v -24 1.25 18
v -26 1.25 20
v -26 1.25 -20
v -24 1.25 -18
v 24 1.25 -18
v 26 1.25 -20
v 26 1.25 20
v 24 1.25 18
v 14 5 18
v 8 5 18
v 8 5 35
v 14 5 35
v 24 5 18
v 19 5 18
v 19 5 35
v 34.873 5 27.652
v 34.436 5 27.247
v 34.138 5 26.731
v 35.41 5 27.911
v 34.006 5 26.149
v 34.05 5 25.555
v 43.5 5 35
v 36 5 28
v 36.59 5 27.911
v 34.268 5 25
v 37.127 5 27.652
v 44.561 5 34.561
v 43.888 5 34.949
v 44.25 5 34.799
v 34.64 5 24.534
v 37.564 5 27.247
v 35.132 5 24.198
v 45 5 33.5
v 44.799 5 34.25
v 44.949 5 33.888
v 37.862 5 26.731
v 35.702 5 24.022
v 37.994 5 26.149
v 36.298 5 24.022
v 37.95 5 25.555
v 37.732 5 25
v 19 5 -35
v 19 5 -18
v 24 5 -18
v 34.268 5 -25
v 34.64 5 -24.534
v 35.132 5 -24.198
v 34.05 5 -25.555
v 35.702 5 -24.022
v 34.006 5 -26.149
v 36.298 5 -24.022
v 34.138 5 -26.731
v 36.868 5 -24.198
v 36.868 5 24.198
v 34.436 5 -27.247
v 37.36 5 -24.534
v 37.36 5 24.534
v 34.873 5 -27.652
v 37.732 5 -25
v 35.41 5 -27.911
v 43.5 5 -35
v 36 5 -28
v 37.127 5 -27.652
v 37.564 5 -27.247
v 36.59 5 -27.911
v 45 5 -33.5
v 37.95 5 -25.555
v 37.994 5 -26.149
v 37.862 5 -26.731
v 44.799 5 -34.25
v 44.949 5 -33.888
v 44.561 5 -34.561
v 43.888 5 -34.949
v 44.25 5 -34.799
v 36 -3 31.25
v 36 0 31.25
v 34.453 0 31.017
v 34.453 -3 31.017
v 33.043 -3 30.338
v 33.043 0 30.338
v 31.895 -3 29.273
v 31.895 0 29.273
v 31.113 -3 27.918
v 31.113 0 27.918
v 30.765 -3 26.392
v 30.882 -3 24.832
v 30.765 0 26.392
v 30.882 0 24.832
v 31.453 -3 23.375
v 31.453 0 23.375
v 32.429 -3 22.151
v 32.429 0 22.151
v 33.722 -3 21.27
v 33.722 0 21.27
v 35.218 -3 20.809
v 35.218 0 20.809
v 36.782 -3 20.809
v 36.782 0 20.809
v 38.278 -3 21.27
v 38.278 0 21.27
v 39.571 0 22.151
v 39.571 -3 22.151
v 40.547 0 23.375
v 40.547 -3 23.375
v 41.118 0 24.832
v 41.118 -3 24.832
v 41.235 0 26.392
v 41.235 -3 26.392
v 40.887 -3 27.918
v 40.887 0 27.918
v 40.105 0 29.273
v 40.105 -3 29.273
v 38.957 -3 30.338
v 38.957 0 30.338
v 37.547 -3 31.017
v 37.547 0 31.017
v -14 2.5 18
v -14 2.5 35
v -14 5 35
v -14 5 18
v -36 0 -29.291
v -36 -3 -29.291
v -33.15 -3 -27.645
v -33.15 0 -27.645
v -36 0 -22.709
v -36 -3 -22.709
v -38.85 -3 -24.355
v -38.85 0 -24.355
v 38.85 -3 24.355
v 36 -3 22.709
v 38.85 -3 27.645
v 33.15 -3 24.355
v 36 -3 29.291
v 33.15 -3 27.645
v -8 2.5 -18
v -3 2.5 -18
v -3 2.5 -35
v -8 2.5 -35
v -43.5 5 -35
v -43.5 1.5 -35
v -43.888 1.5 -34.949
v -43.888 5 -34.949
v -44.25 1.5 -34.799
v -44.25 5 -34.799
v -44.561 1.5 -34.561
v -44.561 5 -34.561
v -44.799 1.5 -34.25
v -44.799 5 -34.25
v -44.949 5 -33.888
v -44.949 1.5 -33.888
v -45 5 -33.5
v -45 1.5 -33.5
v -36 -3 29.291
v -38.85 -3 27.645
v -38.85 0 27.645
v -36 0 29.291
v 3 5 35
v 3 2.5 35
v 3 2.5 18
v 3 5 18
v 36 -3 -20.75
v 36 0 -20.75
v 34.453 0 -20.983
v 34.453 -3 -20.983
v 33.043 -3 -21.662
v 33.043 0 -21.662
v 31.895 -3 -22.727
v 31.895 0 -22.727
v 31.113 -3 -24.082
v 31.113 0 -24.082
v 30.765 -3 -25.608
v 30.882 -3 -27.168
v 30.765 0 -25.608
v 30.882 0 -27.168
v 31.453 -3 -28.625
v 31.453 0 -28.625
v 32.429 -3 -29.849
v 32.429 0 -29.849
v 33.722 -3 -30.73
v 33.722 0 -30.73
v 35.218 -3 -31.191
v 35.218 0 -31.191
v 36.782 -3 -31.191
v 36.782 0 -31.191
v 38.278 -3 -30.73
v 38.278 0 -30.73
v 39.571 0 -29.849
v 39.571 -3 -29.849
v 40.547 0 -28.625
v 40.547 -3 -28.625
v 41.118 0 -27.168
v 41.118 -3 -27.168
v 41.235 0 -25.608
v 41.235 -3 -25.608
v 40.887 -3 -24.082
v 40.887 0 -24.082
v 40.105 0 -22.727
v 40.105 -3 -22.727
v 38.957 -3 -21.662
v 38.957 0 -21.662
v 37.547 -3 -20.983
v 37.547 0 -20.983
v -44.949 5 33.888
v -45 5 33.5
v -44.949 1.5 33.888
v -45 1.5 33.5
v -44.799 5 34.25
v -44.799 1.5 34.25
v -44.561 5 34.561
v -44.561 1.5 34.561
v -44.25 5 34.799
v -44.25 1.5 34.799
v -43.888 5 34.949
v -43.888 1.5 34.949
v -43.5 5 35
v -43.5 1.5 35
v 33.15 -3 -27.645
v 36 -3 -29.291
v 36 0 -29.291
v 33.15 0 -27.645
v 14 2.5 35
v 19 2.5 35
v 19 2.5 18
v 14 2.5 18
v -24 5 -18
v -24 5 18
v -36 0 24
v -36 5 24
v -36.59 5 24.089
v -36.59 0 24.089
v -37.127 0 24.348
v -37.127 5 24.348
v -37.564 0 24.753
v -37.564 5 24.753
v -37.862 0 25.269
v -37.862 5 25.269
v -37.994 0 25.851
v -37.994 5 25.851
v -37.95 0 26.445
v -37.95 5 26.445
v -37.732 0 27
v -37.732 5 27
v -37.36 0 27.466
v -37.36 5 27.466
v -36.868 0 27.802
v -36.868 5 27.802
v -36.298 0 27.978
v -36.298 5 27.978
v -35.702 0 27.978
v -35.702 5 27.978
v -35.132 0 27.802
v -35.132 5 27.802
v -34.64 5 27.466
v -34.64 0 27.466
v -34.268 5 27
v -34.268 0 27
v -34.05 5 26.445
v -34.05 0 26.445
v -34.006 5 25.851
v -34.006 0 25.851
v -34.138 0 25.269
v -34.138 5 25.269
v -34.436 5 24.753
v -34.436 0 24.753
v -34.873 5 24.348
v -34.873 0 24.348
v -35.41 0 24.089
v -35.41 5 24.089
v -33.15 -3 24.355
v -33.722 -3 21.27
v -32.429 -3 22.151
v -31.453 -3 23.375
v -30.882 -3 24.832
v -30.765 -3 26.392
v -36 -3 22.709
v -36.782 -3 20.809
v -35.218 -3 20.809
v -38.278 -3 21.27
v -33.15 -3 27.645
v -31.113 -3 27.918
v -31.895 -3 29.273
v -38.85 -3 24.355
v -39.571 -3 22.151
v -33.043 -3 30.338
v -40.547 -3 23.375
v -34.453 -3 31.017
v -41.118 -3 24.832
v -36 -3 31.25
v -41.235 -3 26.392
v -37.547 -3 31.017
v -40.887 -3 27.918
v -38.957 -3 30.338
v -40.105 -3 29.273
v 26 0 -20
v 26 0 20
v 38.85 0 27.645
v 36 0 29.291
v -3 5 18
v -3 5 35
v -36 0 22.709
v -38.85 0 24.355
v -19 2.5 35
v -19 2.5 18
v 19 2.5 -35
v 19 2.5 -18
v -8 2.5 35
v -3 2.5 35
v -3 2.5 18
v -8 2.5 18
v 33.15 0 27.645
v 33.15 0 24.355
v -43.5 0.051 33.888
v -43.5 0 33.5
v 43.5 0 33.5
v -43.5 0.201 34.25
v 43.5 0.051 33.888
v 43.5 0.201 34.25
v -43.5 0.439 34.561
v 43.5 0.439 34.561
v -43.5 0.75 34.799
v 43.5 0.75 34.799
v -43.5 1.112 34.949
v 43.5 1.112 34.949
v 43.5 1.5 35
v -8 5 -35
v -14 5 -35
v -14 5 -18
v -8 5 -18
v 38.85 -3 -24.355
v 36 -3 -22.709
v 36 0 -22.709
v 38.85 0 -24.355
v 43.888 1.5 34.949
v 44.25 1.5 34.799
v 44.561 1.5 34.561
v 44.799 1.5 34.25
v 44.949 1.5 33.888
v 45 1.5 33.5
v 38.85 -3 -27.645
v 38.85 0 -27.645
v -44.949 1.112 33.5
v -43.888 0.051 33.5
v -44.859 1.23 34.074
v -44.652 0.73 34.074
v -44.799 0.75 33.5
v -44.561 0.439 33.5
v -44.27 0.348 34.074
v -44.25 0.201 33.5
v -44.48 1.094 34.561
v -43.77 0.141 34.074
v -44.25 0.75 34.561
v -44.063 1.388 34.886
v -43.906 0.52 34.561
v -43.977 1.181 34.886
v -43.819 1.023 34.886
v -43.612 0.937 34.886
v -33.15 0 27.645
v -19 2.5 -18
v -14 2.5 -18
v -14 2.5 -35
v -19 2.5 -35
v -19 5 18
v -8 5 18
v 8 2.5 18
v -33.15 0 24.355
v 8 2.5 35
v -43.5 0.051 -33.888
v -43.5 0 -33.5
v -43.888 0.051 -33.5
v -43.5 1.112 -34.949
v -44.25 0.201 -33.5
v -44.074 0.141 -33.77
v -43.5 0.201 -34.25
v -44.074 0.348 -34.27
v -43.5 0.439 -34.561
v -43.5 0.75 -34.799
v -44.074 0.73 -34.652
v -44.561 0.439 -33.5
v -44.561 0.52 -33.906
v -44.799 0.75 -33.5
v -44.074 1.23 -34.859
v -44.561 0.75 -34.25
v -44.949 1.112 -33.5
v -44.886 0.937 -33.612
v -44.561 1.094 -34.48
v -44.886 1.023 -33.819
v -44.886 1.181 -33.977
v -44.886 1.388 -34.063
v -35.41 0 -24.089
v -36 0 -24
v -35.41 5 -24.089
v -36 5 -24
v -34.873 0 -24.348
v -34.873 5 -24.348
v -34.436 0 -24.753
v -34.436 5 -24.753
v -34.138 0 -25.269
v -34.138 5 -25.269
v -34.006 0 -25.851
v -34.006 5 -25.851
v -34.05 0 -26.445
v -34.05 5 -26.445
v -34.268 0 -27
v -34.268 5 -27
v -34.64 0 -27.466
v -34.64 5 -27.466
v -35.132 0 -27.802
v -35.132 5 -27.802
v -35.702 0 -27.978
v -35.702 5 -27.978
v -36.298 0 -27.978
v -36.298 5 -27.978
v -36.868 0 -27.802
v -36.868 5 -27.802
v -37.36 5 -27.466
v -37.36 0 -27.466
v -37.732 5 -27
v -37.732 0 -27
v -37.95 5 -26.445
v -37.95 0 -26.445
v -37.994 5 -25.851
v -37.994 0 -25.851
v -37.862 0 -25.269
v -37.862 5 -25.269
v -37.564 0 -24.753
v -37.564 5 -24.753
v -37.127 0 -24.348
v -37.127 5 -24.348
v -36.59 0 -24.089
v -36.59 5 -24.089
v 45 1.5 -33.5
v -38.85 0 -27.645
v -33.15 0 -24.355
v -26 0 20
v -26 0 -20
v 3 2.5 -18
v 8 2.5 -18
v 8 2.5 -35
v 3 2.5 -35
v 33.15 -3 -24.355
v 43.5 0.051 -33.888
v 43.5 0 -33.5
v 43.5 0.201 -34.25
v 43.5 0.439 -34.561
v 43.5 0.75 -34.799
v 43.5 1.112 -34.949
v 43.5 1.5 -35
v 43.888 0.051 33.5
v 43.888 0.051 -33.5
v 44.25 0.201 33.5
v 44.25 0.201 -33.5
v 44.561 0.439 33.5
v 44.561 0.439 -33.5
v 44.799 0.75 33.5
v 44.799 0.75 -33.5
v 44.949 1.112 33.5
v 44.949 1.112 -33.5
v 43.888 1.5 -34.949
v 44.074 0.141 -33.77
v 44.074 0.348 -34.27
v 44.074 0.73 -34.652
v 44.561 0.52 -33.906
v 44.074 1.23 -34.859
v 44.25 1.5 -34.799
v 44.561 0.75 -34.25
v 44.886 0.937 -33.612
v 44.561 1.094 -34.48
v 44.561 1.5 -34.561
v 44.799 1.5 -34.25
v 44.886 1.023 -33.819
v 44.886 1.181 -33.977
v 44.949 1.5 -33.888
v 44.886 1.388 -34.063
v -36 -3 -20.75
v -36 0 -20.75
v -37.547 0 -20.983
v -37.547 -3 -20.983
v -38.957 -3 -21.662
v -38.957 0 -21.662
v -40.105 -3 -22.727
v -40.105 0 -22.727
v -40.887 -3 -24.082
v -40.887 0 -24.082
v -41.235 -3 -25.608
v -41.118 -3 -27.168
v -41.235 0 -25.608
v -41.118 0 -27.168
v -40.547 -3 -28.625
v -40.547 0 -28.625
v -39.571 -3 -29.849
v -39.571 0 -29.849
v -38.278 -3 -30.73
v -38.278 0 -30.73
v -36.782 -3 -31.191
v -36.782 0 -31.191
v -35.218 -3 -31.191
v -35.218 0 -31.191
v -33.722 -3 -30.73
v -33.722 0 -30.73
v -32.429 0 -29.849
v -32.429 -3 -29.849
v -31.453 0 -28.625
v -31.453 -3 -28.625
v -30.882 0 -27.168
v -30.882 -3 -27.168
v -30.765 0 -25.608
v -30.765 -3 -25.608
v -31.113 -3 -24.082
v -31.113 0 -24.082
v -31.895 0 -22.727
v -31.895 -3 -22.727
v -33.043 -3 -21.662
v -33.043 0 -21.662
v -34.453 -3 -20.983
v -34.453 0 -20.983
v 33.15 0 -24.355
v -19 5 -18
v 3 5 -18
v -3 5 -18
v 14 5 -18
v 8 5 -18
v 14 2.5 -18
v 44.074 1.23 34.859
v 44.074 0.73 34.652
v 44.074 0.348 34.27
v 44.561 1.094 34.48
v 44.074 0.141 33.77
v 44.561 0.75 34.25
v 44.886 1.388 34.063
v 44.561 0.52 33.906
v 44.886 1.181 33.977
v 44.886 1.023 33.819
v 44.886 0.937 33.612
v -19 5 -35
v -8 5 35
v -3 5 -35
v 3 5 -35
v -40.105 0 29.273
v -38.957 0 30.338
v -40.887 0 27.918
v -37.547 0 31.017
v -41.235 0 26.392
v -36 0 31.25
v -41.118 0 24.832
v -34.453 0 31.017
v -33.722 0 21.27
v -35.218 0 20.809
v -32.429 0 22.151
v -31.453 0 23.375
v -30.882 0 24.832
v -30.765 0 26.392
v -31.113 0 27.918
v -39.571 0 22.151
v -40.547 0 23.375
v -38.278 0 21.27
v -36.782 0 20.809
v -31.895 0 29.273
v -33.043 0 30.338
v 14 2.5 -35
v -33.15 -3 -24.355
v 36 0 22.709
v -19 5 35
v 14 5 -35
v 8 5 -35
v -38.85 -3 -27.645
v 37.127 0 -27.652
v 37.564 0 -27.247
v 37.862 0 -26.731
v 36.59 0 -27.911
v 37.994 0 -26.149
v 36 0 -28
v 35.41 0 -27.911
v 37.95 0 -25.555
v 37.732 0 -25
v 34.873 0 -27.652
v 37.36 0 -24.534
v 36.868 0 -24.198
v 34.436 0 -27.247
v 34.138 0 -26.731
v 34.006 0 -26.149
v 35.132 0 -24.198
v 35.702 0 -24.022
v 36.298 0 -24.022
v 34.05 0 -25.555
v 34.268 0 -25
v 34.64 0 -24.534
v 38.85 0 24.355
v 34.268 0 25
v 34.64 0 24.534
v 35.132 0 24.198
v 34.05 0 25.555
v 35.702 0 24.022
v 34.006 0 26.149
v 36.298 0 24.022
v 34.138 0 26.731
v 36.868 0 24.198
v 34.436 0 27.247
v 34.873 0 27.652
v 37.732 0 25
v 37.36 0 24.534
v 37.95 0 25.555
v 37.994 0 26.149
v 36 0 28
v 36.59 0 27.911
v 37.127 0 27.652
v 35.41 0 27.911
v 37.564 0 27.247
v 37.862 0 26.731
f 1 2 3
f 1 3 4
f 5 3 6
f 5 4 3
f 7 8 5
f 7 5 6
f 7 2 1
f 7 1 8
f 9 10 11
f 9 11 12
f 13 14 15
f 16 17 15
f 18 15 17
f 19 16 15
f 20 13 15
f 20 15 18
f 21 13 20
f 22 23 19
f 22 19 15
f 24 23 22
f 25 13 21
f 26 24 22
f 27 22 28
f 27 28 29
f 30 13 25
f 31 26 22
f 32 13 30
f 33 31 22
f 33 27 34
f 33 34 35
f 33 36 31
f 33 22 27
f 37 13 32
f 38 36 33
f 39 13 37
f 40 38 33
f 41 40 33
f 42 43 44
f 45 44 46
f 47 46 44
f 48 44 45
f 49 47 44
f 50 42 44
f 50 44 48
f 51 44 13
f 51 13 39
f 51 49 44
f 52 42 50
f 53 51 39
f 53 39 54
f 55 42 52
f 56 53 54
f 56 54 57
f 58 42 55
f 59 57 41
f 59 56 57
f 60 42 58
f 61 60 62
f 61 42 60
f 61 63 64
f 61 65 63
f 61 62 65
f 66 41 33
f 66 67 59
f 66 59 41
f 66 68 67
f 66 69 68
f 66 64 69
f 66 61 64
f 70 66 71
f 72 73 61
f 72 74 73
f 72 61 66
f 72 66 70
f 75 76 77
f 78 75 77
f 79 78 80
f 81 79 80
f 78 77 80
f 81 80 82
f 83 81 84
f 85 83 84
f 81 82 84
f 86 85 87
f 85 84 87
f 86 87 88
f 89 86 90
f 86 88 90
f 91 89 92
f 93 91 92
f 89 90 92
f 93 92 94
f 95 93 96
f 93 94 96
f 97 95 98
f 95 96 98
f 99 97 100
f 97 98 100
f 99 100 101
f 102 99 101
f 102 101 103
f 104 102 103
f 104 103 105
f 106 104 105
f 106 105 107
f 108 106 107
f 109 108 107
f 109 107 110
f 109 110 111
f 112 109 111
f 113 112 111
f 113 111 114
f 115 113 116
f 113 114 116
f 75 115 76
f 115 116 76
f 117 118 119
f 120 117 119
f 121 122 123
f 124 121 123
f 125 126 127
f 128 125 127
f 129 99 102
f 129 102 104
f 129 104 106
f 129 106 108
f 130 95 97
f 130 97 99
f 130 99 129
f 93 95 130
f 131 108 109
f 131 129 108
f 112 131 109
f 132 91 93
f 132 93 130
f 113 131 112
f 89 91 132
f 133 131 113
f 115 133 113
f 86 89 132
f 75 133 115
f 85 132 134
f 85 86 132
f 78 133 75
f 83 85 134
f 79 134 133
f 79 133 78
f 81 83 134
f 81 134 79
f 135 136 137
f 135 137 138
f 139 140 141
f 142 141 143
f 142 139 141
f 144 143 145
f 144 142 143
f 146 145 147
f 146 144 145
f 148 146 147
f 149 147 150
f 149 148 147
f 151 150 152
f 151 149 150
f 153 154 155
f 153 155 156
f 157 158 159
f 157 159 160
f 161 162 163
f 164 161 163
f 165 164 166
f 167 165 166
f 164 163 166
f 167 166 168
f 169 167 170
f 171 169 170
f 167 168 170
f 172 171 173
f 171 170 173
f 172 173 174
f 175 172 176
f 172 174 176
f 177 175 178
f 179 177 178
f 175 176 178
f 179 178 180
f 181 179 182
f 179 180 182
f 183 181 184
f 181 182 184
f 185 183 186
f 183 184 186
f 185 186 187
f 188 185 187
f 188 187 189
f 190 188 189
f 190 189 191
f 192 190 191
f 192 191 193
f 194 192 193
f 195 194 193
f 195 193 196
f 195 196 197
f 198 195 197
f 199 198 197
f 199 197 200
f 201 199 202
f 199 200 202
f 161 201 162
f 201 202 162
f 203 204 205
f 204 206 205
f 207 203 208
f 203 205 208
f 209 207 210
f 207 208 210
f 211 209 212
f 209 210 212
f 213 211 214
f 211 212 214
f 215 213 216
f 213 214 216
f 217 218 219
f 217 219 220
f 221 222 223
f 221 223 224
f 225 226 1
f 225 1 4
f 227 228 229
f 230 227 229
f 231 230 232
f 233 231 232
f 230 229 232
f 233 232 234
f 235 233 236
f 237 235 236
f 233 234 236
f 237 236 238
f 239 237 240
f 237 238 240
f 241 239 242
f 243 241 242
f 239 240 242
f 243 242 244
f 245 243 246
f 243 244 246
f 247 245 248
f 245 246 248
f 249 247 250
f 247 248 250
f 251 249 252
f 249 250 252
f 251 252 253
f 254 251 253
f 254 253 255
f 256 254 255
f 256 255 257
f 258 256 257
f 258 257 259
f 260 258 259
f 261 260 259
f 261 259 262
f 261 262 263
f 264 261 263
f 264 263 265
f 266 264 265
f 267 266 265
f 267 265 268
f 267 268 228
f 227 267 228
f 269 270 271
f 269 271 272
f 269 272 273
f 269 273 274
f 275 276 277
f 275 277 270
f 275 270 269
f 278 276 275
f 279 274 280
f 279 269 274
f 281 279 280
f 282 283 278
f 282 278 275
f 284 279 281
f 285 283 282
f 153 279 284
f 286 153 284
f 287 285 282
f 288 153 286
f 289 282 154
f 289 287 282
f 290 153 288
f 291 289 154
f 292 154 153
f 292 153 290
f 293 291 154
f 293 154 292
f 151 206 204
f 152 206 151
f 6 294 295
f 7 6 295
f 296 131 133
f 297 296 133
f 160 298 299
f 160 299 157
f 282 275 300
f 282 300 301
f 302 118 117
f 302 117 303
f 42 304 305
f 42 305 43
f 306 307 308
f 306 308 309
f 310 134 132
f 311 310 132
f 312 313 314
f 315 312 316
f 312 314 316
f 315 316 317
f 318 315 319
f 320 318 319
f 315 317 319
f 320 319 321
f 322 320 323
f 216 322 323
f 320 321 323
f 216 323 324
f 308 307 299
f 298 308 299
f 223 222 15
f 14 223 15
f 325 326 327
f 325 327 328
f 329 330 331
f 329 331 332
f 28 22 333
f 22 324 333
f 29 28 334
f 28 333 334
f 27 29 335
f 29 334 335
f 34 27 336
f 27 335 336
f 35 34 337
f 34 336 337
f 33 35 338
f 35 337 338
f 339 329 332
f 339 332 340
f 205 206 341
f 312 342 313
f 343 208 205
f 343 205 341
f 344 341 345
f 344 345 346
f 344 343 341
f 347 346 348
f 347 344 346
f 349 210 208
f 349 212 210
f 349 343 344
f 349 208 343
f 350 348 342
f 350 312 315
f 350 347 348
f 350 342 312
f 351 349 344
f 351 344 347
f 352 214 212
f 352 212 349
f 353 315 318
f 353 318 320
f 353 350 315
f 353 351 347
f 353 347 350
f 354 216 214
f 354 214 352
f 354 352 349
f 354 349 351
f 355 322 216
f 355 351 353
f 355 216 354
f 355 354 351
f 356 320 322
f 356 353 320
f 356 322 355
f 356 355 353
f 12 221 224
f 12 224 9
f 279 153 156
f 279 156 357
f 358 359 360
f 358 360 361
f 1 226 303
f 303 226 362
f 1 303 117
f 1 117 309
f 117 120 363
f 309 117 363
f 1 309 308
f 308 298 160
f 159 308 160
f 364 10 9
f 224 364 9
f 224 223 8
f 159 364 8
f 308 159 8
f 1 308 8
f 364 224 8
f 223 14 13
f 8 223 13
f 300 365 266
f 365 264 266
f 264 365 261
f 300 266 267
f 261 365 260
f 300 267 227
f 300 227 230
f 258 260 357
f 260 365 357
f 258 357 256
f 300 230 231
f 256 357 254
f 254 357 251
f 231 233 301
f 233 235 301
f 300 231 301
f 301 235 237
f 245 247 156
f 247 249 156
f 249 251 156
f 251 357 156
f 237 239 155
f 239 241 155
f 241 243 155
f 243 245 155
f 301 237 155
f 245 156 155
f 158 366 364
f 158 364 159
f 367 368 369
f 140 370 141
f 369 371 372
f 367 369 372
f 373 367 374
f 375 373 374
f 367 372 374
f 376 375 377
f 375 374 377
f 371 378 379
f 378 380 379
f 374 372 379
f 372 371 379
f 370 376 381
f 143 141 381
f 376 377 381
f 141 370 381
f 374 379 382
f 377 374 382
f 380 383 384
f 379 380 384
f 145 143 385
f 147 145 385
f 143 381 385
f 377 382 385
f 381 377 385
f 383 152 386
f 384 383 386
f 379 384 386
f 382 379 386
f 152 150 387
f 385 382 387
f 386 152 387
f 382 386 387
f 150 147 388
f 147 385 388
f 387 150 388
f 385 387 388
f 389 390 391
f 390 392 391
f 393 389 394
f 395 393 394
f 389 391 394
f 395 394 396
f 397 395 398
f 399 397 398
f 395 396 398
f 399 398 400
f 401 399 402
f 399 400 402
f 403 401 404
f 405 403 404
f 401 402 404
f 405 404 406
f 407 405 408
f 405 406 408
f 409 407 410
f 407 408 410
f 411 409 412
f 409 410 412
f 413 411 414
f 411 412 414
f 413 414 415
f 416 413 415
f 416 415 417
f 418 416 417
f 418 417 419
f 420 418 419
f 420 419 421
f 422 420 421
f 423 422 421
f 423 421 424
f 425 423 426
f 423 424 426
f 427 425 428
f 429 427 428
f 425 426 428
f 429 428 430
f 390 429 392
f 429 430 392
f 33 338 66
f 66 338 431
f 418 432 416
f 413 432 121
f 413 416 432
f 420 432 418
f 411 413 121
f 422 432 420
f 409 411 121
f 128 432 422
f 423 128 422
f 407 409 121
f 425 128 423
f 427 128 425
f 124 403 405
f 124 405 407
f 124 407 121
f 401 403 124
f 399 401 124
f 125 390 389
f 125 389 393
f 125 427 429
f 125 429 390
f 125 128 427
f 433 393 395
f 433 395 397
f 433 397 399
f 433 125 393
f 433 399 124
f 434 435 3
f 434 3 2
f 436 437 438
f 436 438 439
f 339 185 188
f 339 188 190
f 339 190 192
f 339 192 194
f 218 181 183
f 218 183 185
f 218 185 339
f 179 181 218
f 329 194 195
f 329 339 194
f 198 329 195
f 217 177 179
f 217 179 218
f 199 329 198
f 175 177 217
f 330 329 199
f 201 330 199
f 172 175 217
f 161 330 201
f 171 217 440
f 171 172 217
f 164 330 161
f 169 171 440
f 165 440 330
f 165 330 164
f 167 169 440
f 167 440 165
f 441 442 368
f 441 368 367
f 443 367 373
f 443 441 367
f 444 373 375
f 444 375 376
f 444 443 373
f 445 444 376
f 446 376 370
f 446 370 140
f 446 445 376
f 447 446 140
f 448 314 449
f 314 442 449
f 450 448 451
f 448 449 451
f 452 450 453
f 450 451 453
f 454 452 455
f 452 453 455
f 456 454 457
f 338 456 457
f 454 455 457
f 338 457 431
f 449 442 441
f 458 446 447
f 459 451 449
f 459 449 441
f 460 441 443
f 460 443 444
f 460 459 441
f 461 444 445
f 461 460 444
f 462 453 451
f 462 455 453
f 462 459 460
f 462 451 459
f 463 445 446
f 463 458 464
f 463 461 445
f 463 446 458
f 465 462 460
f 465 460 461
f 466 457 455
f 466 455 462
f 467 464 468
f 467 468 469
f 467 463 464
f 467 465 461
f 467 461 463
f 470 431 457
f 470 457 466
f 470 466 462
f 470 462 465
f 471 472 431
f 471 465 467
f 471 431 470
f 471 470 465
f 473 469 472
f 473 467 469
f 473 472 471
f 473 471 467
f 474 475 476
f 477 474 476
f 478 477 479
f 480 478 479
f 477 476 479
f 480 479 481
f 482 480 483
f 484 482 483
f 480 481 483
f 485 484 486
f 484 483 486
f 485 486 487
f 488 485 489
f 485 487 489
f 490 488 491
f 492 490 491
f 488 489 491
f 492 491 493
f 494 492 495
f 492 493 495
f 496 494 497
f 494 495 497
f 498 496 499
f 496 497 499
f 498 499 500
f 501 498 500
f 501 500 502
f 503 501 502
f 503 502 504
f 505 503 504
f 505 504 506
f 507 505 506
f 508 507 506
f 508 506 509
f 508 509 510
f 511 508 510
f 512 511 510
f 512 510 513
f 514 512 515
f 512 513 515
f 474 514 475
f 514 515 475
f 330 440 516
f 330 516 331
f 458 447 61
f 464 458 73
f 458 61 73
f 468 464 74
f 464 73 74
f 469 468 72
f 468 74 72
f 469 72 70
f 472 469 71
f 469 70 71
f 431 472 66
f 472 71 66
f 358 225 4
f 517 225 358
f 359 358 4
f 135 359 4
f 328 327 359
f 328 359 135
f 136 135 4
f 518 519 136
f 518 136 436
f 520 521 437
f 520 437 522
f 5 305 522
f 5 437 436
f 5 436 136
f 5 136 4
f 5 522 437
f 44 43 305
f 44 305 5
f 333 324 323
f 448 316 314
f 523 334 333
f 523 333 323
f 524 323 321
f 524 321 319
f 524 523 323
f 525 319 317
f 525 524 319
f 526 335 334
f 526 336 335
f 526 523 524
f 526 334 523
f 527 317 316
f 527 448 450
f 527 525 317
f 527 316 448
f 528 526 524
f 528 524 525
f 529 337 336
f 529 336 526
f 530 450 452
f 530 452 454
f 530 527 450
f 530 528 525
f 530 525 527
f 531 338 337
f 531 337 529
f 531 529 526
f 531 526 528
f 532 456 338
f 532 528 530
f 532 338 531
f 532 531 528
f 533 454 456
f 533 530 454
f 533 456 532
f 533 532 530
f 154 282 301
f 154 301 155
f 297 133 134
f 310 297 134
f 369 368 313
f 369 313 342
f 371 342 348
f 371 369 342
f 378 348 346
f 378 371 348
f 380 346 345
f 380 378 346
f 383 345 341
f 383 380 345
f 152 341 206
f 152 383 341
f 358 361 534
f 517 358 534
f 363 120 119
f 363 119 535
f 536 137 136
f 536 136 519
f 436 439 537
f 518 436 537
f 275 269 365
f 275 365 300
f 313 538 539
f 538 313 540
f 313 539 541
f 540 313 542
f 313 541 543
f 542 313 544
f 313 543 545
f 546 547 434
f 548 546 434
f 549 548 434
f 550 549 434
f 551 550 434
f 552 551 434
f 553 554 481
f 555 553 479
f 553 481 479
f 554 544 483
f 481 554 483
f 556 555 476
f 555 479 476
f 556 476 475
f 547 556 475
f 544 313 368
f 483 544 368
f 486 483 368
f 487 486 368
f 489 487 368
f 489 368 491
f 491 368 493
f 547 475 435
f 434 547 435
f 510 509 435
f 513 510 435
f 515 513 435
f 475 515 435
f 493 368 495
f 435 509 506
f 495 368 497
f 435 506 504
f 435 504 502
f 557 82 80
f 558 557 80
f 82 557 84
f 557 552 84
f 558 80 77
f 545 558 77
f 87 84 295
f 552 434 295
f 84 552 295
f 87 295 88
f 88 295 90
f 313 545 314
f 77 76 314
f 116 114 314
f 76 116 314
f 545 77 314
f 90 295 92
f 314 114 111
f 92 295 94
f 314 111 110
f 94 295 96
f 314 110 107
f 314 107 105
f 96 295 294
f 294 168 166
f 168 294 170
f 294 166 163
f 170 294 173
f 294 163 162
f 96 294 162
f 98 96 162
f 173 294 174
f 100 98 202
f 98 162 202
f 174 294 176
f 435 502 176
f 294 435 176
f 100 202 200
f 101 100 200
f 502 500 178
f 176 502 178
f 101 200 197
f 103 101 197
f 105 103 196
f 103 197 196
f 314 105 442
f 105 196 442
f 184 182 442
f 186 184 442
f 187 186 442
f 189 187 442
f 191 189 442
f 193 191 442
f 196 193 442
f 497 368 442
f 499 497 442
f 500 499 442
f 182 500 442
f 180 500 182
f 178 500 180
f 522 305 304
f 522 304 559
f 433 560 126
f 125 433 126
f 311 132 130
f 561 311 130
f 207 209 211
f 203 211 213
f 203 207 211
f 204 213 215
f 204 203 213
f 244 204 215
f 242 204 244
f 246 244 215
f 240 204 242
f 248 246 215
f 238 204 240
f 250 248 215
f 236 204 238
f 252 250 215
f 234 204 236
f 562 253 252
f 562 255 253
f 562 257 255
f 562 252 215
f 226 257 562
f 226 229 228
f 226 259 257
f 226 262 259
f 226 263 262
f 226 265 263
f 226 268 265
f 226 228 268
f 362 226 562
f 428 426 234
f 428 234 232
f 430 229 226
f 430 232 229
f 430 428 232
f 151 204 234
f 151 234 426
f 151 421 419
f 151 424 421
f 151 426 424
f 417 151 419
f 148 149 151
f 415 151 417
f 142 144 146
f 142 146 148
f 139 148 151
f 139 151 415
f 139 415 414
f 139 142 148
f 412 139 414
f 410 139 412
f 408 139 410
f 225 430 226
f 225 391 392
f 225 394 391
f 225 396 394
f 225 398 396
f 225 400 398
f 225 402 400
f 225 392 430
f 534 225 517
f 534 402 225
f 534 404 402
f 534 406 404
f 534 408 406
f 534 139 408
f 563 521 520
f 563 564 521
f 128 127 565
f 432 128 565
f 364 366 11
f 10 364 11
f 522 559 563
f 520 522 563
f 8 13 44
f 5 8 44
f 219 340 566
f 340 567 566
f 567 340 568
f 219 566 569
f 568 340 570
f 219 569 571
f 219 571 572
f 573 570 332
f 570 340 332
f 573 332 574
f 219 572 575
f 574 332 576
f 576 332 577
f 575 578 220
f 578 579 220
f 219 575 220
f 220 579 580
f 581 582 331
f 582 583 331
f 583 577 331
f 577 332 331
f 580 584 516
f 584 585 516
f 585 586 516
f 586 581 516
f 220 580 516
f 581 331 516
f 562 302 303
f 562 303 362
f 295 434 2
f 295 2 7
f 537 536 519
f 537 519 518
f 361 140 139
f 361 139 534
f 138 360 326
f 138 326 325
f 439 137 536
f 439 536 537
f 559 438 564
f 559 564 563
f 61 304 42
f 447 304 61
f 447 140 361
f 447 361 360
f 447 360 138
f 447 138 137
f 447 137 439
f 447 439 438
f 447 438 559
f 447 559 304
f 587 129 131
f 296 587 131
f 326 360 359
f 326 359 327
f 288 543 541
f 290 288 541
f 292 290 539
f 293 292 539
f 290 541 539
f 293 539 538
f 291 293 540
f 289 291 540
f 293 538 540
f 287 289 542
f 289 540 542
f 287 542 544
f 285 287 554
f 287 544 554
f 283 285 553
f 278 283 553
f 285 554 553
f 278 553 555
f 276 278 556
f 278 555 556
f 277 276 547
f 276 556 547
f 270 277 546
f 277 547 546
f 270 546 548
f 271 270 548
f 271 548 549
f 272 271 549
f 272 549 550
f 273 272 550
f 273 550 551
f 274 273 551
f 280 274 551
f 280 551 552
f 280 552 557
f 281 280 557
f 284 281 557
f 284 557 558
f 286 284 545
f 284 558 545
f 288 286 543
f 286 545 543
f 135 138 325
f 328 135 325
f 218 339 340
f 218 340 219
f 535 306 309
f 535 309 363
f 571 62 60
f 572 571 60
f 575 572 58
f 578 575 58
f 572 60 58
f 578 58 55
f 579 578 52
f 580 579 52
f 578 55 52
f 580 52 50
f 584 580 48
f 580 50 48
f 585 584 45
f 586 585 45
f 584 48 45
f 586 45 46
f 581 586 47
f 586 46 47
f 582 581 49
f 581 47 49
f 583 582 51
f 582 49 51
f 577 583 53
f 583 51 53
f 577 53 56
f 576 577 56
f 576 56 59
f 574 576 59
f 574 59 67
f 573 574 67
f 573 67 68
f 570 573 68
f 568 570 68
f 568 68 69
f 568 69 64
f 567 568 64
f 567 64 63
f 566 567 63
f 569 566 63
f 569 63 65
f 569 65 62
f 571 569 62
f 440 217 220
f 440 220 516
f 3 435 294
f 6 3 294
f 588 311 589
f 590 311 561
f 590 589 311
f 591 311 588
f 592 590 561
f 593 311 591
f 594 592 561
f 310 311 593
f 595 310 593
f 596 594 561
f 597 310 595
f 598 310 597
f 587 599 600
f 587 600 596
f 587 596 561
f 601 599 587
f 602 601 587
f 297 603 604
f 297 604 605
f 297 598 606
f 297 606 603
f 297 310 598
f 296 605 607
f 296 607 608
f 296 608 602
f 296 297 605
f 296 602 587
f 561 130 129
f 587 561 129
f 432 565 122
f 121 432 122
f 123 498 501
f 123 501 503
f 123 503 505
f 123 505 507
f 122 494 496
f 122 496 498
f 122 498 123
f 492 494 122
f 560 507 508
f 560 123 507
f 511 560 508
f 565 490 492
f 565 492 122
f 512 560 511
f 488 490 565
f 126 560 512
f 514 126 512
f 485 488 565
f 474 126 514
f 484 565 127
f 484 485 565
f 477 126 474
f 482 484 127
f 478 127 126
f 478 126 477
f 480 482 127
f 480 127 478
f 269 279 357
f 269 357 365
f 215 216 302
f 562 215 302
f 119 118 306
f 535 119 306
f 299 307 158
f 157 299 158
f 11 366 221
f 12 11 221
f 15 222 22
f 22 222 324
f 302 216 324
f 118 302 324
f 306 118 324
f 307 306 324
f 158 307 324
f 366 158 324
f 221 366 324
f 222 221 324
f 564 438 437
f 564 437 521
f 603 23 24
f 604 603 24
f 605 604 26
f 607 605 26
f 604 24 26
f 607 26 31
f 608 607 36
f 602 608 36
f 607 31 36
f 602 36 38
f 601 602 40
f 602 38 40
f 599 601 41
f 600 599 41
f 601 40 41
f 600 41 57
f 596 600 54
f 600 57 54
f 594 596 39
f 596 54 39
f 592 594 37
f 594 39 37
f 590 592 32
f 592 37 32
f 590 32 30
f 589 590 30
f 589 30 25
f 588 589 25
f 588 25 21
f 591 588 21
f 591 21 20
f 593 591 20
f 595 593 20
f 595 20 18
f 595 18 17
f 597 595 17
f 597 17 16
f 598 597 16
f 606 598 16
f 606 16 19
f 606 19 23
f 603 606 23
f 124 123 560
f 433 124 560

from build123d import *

# Parameters (mm, degrees)
SKETCH1_W            = 90
SKETCH1_H            = 70
BASE_PLATE_DEPTH     = 5
SKETCH7_R            = 2
SCREW_CUT_DEPTH      = 5
SKETCH13_W           = 48
SKETCH13_H           = 36
SCREEN_CUT_OUT_DEPTH = 10
SKETCH21_W           = 52
SKETCH21_H           = 40
SKETCH21_W_2         = 48
SKETCH21_H_2         = 36
SCREEN_MOUNT_DEPTH   = 1.25
SKETCH15_R           = 5.25
M3_NUT_OUTER_DEPTH   = 3
SKETCH18_R           = 2
SCREW_HOLE_DEPTH     = 3
M3_NUT_DEPTH         = 3
WATER_GROVES_REACH   = 85.367
SKETCH20_W           = 5
SKETCH20_H           = 2.5
FILLET1_R            = 1.5
FILLET2_R            = 1.5
FILLET3_R            = 1.5
FILLET4_R            = 1.5


with BuildPart() as part:
    # Sketch1 → Base Plate (new body)
    with BuildSketch(Plane(origin=(0, 0, 0), x_dir=(1, 0, 0), z_dir=(0, 1, 0))):
        Rectangle(SKETCH1_W, SKETCH1_H)
    extrude(amount=BASE_PLATE_DEPTH)

    # Sketch7 → Screw Cut (cut)
    with BuildSketch(Plane(origin=(0, 5, 0), x_dir=(1, 0, 0), z_dir=(0, 1, 0))):
        with Locations(Location((-36, 26, 0), (0, 0, 270))):
            Circle(SKETCH7_R)
        with Locations(Location((-36, -26, 0), (0, 0, 90))):
            Circle(SKETCH7_R)
        with Locations(Location((36, -26, 0), (0, 0, 270))):
            Circle(SKETCH7_R)
        with Locations(Location((36, 26, 0), (0, 0, 90))):
            Circle(SKETCH7_R)
    extrude(amount=-SCREW_CUT_DEPTH, mode=Mode.SUBTRACT)

    # Sketch13 → Screen Cut Out (cut)
    with BuildSketch(Plane(origin=(0, 5, 0), x_dir=(1, 0, 0), z_dir=(0, 1, 0))):
        Rectangle(SKETCH13_W, SKETCH13_H)
    extrude(amount=-SCREEN_CUT_OUT_DEPTH, mode=Mode.SUBTRACT)

    # Sketch21 → Screen Mount (cut)
    with BuildSketch(Plane.XZ):
        Rectangle(SKETCH21_W, SKETCH21_H)
        Rectangle(SKETCH21_W_2, SKETCH21_H_2, mode=Mode.SUBTRACT)
    extrude(amount=-SCREEN_MOUNT_DEPTH, mode=Mode.SUBTRACT)

    # Sketch15 → M3 Nut Outer (add)
    with BuildSketch(Plane(origin=(-42.5, 0, -25), x_dir=(1, 0, 0), z_dir=(0, -1, 0))):
        with Locations(Location((6.5, -1, 0), (0, 0, 90))):
            Circle(SKETCH15_R)
        with Locations(Location((6.5, 51, 0), (0, 0, 90))):
            Circle(SKETCH15_R)
        with Locations(Location((78.5, 51, 0), (0, 0, 90))):
            Circle(SKETCH15_R)
        with Locations(Location((78.5, -1, 0), (0, 0, 90))):
            Circle(SKETCH15_R)
    extrude(amount=M3_NUT_OUTER_DEPTH)

    # Sketch18 → Screw Hole (cut)
    with BuildSketch(Plane(origin=(0, 0, 0), x_dir=(1, 0, 0), z_dir=(0, 1, 0))):
        with Locations(Location((-36, 26, 0), (0, 0, 270))):
            Circle(SKETCH18_R)
        with Locations(Location((-36, -26, 0), (0, 0, 90))):
            Circle(SKETCH18_R)
        with Locations(Location((36, 26, 0), (0, 0, 90))):
            Circle(SKETCH18_R)
        with Locations(Location((36, -26, 0), (0, 0, 270))):
            Circle(SKETCH18_R)
    extrude(amount=-SCREW_HOLE_DEPTH, mode=Mode.SUBTRACT)

    # Sketch19 → M3 Nut (cut)
    with BuildSketch(Plane.XZ.offset(3)):
        Polygon((-36, -22.709103466), (-38.85, -24.354551733), (-38.85, -27.645448267), (-36, -29.290896534), (-33.15, -27.645448267), (-33.15, -24.354551733), align=None)
        Polygon((-33.15, 24.354551733), (-36, 22.709103466), (-38.85, 24.354551733), (-38.85, 27.645448267), (-36, 29.290896534), (-33.15, 27.645448267), align=None)
        Polygon((33.15, -24.354551733), (36, -22.709103466), (38.85, -24.354551733), (38.85, -27.645448267), (36, -29.290896534), (33.15, -27.645448267), align=None)
        Polygon((36, 22.709103466), (38.85, 24.354551733), (38.85, 27.645448267), (36, 29.290896534), (33.15, 27.645448267), (33.15, 24.354551733), align=None)
    extrude(amount=-M3_NUT_DEPTH, mode=Mode.SUBTRACT)

    # Water Groves: up to this face of the body (flat: up to its plane)
    water_groves_end = Plane(part.part.faces().sort_by_distance((0, 2.5, 35))[0])
    # Sketch20 → Water Groves (cut, up to the picked face)
    with BuildSketch(Plane(origin=(0, 0, -35), x_dir=(-1, 0, 0), z_dir=(0, 0, -1)), mode=Mode.PRIVATE) as water_groves_sk1:
        with Locations((-5.5, 3.75)):
            Rectangle(SKETCH20_W, SKETCH20_H)
    water_groves_tool1 = split(extrude(water_groves_sk1.sketch, amount=-WATER_GROVES_REACH, mode=Mode.PRIVATE), bisect_by=water_groves_end, keep=Keep.BOTH, mode=Mode.PRIVATE)
    # Sketch20 → Water Groves (cut, up to the picked face)
    with BuildSketch(Plane(origin=(0, 0, -35), x_dir=(-1, 0, 0), z_dir=(0, 0, -1)), mode=Mode.PRIVATE) as water_groves_sk2:
        with Locations((-16.5, 3.75)):
            Rectangle(SKETCH20_W, SKETCH20_H)
    water_groves_tool2 = split(extrude(water_groves_sk2.sketch, amount=-WATER_GROVES_REACH, mode=Mode.PRIVATE), bisect_by=water_groves_end, keep=Keep.BOTH, mode=Mode.PRIVATE)
    # Sketch20 → Water Groves (cut, up to the picked face)
    with BuildSketch(Plane(origin=(0, 0, -35), x_dir=(-1, 0, 0), z_dir=(0, 0, -1)), mode=Mode.PRIVATE) as water_groves_sk3:
        with Locations((16.5, 3.75)):
            Rectangle(SKETCH20_W, SKETCH20_H)
    water_groves_tool3 = split(extrude(water_groves_sk3.sketch, amount=-WATER_GROVES_REACH, mode=Mode.PRIVATE), bisect_by=water_groves_end, keep=Keep.BOTH, mode=Mode.PRIVATE)
    # Sketch20 → Water Groves (cut, up to the picked face)
    with BuildSketch(Plane(origin=(0, 0, -35), x_dir=(-1, 0, 0), z_dir=(0, 0, -1)), mode=Mode.PRIVATE) as water_groves_sk4:
        with Locations((5.5, 3.75)):
            Rectangle(SKETCH20_W, SKETCH20_H)
    water_groves_tool4 = split(extrude(water_groves_sk4.sketch, amount=-WATER_GROVES_REACH, mode=Mode.PRIVATE), bisect_by=water_groves_end, keep=Keep.BOTH, mode=Mode.PRIVATE)
    add(water_groves_tool1.solids().sort_by(Axis((5.5, 3.75, -35), (0, 0, 1)))[0], mode=Mode.SUBTRACT)
    add(water_groves_tool2.solids().sort_by(Axis((16.5, 3.75, -35), (0, 0, 1)))[0], mode=Mode.SUBTRACT)
    add(water_groves_tool3.solids().sort_by(Axis((-16.5, 3.75, -35), (0, 0, 1)))[0], mode=Mode.SUBTRACT)
    add(water_groves_tool4.solids().sort_by(Axis((-5.5, 3.75, -35), (0, 0, 1)))[0], mode=Mode.SUBTRACT)

    # Fillet1
    fillet1_edges = [part.edges().sort_by_distance(p)[0] for p in [
        (0, 0, -35),
    ]]
    fillet(fillet1_edges, radius=FILLET1_R)

    # Fillet2
    fillet2_edges = [part.edges().sort_by_distance(p)[0] for p in [
        (-45, 0, 0.75),
        (-45, 0.439339828, -34.560660172),
        (-45, 3.25, -35),
    ]]
    fillet(fillet2_edges, radius=FILLET2_R)

    # Fillet3
    fillet3_edges = [part.edges().sort_by_distance(p)[0] for p in [
        (0.75, 0, 35),
        (-44.560660172, 0.439339828, 35),
        (-45, 3.25, 35),
    ]]
    fillet(fillet3_edges, radius=FILLET3_R)

    # Fillet4
    fillet4_edges = [part.edges().sort_by_distance(p)[0] for p in [
        (45, 0.439339828, -34.560660172),
        (45, 0, 0),
        (45, 0.439339828, 34.560660172),
        (45, 3.25, -35),
        (45, 3.25, 35),
    ]]
    fillet(fillet4_edges, radius=FILLET4_R)


solid = part.part
